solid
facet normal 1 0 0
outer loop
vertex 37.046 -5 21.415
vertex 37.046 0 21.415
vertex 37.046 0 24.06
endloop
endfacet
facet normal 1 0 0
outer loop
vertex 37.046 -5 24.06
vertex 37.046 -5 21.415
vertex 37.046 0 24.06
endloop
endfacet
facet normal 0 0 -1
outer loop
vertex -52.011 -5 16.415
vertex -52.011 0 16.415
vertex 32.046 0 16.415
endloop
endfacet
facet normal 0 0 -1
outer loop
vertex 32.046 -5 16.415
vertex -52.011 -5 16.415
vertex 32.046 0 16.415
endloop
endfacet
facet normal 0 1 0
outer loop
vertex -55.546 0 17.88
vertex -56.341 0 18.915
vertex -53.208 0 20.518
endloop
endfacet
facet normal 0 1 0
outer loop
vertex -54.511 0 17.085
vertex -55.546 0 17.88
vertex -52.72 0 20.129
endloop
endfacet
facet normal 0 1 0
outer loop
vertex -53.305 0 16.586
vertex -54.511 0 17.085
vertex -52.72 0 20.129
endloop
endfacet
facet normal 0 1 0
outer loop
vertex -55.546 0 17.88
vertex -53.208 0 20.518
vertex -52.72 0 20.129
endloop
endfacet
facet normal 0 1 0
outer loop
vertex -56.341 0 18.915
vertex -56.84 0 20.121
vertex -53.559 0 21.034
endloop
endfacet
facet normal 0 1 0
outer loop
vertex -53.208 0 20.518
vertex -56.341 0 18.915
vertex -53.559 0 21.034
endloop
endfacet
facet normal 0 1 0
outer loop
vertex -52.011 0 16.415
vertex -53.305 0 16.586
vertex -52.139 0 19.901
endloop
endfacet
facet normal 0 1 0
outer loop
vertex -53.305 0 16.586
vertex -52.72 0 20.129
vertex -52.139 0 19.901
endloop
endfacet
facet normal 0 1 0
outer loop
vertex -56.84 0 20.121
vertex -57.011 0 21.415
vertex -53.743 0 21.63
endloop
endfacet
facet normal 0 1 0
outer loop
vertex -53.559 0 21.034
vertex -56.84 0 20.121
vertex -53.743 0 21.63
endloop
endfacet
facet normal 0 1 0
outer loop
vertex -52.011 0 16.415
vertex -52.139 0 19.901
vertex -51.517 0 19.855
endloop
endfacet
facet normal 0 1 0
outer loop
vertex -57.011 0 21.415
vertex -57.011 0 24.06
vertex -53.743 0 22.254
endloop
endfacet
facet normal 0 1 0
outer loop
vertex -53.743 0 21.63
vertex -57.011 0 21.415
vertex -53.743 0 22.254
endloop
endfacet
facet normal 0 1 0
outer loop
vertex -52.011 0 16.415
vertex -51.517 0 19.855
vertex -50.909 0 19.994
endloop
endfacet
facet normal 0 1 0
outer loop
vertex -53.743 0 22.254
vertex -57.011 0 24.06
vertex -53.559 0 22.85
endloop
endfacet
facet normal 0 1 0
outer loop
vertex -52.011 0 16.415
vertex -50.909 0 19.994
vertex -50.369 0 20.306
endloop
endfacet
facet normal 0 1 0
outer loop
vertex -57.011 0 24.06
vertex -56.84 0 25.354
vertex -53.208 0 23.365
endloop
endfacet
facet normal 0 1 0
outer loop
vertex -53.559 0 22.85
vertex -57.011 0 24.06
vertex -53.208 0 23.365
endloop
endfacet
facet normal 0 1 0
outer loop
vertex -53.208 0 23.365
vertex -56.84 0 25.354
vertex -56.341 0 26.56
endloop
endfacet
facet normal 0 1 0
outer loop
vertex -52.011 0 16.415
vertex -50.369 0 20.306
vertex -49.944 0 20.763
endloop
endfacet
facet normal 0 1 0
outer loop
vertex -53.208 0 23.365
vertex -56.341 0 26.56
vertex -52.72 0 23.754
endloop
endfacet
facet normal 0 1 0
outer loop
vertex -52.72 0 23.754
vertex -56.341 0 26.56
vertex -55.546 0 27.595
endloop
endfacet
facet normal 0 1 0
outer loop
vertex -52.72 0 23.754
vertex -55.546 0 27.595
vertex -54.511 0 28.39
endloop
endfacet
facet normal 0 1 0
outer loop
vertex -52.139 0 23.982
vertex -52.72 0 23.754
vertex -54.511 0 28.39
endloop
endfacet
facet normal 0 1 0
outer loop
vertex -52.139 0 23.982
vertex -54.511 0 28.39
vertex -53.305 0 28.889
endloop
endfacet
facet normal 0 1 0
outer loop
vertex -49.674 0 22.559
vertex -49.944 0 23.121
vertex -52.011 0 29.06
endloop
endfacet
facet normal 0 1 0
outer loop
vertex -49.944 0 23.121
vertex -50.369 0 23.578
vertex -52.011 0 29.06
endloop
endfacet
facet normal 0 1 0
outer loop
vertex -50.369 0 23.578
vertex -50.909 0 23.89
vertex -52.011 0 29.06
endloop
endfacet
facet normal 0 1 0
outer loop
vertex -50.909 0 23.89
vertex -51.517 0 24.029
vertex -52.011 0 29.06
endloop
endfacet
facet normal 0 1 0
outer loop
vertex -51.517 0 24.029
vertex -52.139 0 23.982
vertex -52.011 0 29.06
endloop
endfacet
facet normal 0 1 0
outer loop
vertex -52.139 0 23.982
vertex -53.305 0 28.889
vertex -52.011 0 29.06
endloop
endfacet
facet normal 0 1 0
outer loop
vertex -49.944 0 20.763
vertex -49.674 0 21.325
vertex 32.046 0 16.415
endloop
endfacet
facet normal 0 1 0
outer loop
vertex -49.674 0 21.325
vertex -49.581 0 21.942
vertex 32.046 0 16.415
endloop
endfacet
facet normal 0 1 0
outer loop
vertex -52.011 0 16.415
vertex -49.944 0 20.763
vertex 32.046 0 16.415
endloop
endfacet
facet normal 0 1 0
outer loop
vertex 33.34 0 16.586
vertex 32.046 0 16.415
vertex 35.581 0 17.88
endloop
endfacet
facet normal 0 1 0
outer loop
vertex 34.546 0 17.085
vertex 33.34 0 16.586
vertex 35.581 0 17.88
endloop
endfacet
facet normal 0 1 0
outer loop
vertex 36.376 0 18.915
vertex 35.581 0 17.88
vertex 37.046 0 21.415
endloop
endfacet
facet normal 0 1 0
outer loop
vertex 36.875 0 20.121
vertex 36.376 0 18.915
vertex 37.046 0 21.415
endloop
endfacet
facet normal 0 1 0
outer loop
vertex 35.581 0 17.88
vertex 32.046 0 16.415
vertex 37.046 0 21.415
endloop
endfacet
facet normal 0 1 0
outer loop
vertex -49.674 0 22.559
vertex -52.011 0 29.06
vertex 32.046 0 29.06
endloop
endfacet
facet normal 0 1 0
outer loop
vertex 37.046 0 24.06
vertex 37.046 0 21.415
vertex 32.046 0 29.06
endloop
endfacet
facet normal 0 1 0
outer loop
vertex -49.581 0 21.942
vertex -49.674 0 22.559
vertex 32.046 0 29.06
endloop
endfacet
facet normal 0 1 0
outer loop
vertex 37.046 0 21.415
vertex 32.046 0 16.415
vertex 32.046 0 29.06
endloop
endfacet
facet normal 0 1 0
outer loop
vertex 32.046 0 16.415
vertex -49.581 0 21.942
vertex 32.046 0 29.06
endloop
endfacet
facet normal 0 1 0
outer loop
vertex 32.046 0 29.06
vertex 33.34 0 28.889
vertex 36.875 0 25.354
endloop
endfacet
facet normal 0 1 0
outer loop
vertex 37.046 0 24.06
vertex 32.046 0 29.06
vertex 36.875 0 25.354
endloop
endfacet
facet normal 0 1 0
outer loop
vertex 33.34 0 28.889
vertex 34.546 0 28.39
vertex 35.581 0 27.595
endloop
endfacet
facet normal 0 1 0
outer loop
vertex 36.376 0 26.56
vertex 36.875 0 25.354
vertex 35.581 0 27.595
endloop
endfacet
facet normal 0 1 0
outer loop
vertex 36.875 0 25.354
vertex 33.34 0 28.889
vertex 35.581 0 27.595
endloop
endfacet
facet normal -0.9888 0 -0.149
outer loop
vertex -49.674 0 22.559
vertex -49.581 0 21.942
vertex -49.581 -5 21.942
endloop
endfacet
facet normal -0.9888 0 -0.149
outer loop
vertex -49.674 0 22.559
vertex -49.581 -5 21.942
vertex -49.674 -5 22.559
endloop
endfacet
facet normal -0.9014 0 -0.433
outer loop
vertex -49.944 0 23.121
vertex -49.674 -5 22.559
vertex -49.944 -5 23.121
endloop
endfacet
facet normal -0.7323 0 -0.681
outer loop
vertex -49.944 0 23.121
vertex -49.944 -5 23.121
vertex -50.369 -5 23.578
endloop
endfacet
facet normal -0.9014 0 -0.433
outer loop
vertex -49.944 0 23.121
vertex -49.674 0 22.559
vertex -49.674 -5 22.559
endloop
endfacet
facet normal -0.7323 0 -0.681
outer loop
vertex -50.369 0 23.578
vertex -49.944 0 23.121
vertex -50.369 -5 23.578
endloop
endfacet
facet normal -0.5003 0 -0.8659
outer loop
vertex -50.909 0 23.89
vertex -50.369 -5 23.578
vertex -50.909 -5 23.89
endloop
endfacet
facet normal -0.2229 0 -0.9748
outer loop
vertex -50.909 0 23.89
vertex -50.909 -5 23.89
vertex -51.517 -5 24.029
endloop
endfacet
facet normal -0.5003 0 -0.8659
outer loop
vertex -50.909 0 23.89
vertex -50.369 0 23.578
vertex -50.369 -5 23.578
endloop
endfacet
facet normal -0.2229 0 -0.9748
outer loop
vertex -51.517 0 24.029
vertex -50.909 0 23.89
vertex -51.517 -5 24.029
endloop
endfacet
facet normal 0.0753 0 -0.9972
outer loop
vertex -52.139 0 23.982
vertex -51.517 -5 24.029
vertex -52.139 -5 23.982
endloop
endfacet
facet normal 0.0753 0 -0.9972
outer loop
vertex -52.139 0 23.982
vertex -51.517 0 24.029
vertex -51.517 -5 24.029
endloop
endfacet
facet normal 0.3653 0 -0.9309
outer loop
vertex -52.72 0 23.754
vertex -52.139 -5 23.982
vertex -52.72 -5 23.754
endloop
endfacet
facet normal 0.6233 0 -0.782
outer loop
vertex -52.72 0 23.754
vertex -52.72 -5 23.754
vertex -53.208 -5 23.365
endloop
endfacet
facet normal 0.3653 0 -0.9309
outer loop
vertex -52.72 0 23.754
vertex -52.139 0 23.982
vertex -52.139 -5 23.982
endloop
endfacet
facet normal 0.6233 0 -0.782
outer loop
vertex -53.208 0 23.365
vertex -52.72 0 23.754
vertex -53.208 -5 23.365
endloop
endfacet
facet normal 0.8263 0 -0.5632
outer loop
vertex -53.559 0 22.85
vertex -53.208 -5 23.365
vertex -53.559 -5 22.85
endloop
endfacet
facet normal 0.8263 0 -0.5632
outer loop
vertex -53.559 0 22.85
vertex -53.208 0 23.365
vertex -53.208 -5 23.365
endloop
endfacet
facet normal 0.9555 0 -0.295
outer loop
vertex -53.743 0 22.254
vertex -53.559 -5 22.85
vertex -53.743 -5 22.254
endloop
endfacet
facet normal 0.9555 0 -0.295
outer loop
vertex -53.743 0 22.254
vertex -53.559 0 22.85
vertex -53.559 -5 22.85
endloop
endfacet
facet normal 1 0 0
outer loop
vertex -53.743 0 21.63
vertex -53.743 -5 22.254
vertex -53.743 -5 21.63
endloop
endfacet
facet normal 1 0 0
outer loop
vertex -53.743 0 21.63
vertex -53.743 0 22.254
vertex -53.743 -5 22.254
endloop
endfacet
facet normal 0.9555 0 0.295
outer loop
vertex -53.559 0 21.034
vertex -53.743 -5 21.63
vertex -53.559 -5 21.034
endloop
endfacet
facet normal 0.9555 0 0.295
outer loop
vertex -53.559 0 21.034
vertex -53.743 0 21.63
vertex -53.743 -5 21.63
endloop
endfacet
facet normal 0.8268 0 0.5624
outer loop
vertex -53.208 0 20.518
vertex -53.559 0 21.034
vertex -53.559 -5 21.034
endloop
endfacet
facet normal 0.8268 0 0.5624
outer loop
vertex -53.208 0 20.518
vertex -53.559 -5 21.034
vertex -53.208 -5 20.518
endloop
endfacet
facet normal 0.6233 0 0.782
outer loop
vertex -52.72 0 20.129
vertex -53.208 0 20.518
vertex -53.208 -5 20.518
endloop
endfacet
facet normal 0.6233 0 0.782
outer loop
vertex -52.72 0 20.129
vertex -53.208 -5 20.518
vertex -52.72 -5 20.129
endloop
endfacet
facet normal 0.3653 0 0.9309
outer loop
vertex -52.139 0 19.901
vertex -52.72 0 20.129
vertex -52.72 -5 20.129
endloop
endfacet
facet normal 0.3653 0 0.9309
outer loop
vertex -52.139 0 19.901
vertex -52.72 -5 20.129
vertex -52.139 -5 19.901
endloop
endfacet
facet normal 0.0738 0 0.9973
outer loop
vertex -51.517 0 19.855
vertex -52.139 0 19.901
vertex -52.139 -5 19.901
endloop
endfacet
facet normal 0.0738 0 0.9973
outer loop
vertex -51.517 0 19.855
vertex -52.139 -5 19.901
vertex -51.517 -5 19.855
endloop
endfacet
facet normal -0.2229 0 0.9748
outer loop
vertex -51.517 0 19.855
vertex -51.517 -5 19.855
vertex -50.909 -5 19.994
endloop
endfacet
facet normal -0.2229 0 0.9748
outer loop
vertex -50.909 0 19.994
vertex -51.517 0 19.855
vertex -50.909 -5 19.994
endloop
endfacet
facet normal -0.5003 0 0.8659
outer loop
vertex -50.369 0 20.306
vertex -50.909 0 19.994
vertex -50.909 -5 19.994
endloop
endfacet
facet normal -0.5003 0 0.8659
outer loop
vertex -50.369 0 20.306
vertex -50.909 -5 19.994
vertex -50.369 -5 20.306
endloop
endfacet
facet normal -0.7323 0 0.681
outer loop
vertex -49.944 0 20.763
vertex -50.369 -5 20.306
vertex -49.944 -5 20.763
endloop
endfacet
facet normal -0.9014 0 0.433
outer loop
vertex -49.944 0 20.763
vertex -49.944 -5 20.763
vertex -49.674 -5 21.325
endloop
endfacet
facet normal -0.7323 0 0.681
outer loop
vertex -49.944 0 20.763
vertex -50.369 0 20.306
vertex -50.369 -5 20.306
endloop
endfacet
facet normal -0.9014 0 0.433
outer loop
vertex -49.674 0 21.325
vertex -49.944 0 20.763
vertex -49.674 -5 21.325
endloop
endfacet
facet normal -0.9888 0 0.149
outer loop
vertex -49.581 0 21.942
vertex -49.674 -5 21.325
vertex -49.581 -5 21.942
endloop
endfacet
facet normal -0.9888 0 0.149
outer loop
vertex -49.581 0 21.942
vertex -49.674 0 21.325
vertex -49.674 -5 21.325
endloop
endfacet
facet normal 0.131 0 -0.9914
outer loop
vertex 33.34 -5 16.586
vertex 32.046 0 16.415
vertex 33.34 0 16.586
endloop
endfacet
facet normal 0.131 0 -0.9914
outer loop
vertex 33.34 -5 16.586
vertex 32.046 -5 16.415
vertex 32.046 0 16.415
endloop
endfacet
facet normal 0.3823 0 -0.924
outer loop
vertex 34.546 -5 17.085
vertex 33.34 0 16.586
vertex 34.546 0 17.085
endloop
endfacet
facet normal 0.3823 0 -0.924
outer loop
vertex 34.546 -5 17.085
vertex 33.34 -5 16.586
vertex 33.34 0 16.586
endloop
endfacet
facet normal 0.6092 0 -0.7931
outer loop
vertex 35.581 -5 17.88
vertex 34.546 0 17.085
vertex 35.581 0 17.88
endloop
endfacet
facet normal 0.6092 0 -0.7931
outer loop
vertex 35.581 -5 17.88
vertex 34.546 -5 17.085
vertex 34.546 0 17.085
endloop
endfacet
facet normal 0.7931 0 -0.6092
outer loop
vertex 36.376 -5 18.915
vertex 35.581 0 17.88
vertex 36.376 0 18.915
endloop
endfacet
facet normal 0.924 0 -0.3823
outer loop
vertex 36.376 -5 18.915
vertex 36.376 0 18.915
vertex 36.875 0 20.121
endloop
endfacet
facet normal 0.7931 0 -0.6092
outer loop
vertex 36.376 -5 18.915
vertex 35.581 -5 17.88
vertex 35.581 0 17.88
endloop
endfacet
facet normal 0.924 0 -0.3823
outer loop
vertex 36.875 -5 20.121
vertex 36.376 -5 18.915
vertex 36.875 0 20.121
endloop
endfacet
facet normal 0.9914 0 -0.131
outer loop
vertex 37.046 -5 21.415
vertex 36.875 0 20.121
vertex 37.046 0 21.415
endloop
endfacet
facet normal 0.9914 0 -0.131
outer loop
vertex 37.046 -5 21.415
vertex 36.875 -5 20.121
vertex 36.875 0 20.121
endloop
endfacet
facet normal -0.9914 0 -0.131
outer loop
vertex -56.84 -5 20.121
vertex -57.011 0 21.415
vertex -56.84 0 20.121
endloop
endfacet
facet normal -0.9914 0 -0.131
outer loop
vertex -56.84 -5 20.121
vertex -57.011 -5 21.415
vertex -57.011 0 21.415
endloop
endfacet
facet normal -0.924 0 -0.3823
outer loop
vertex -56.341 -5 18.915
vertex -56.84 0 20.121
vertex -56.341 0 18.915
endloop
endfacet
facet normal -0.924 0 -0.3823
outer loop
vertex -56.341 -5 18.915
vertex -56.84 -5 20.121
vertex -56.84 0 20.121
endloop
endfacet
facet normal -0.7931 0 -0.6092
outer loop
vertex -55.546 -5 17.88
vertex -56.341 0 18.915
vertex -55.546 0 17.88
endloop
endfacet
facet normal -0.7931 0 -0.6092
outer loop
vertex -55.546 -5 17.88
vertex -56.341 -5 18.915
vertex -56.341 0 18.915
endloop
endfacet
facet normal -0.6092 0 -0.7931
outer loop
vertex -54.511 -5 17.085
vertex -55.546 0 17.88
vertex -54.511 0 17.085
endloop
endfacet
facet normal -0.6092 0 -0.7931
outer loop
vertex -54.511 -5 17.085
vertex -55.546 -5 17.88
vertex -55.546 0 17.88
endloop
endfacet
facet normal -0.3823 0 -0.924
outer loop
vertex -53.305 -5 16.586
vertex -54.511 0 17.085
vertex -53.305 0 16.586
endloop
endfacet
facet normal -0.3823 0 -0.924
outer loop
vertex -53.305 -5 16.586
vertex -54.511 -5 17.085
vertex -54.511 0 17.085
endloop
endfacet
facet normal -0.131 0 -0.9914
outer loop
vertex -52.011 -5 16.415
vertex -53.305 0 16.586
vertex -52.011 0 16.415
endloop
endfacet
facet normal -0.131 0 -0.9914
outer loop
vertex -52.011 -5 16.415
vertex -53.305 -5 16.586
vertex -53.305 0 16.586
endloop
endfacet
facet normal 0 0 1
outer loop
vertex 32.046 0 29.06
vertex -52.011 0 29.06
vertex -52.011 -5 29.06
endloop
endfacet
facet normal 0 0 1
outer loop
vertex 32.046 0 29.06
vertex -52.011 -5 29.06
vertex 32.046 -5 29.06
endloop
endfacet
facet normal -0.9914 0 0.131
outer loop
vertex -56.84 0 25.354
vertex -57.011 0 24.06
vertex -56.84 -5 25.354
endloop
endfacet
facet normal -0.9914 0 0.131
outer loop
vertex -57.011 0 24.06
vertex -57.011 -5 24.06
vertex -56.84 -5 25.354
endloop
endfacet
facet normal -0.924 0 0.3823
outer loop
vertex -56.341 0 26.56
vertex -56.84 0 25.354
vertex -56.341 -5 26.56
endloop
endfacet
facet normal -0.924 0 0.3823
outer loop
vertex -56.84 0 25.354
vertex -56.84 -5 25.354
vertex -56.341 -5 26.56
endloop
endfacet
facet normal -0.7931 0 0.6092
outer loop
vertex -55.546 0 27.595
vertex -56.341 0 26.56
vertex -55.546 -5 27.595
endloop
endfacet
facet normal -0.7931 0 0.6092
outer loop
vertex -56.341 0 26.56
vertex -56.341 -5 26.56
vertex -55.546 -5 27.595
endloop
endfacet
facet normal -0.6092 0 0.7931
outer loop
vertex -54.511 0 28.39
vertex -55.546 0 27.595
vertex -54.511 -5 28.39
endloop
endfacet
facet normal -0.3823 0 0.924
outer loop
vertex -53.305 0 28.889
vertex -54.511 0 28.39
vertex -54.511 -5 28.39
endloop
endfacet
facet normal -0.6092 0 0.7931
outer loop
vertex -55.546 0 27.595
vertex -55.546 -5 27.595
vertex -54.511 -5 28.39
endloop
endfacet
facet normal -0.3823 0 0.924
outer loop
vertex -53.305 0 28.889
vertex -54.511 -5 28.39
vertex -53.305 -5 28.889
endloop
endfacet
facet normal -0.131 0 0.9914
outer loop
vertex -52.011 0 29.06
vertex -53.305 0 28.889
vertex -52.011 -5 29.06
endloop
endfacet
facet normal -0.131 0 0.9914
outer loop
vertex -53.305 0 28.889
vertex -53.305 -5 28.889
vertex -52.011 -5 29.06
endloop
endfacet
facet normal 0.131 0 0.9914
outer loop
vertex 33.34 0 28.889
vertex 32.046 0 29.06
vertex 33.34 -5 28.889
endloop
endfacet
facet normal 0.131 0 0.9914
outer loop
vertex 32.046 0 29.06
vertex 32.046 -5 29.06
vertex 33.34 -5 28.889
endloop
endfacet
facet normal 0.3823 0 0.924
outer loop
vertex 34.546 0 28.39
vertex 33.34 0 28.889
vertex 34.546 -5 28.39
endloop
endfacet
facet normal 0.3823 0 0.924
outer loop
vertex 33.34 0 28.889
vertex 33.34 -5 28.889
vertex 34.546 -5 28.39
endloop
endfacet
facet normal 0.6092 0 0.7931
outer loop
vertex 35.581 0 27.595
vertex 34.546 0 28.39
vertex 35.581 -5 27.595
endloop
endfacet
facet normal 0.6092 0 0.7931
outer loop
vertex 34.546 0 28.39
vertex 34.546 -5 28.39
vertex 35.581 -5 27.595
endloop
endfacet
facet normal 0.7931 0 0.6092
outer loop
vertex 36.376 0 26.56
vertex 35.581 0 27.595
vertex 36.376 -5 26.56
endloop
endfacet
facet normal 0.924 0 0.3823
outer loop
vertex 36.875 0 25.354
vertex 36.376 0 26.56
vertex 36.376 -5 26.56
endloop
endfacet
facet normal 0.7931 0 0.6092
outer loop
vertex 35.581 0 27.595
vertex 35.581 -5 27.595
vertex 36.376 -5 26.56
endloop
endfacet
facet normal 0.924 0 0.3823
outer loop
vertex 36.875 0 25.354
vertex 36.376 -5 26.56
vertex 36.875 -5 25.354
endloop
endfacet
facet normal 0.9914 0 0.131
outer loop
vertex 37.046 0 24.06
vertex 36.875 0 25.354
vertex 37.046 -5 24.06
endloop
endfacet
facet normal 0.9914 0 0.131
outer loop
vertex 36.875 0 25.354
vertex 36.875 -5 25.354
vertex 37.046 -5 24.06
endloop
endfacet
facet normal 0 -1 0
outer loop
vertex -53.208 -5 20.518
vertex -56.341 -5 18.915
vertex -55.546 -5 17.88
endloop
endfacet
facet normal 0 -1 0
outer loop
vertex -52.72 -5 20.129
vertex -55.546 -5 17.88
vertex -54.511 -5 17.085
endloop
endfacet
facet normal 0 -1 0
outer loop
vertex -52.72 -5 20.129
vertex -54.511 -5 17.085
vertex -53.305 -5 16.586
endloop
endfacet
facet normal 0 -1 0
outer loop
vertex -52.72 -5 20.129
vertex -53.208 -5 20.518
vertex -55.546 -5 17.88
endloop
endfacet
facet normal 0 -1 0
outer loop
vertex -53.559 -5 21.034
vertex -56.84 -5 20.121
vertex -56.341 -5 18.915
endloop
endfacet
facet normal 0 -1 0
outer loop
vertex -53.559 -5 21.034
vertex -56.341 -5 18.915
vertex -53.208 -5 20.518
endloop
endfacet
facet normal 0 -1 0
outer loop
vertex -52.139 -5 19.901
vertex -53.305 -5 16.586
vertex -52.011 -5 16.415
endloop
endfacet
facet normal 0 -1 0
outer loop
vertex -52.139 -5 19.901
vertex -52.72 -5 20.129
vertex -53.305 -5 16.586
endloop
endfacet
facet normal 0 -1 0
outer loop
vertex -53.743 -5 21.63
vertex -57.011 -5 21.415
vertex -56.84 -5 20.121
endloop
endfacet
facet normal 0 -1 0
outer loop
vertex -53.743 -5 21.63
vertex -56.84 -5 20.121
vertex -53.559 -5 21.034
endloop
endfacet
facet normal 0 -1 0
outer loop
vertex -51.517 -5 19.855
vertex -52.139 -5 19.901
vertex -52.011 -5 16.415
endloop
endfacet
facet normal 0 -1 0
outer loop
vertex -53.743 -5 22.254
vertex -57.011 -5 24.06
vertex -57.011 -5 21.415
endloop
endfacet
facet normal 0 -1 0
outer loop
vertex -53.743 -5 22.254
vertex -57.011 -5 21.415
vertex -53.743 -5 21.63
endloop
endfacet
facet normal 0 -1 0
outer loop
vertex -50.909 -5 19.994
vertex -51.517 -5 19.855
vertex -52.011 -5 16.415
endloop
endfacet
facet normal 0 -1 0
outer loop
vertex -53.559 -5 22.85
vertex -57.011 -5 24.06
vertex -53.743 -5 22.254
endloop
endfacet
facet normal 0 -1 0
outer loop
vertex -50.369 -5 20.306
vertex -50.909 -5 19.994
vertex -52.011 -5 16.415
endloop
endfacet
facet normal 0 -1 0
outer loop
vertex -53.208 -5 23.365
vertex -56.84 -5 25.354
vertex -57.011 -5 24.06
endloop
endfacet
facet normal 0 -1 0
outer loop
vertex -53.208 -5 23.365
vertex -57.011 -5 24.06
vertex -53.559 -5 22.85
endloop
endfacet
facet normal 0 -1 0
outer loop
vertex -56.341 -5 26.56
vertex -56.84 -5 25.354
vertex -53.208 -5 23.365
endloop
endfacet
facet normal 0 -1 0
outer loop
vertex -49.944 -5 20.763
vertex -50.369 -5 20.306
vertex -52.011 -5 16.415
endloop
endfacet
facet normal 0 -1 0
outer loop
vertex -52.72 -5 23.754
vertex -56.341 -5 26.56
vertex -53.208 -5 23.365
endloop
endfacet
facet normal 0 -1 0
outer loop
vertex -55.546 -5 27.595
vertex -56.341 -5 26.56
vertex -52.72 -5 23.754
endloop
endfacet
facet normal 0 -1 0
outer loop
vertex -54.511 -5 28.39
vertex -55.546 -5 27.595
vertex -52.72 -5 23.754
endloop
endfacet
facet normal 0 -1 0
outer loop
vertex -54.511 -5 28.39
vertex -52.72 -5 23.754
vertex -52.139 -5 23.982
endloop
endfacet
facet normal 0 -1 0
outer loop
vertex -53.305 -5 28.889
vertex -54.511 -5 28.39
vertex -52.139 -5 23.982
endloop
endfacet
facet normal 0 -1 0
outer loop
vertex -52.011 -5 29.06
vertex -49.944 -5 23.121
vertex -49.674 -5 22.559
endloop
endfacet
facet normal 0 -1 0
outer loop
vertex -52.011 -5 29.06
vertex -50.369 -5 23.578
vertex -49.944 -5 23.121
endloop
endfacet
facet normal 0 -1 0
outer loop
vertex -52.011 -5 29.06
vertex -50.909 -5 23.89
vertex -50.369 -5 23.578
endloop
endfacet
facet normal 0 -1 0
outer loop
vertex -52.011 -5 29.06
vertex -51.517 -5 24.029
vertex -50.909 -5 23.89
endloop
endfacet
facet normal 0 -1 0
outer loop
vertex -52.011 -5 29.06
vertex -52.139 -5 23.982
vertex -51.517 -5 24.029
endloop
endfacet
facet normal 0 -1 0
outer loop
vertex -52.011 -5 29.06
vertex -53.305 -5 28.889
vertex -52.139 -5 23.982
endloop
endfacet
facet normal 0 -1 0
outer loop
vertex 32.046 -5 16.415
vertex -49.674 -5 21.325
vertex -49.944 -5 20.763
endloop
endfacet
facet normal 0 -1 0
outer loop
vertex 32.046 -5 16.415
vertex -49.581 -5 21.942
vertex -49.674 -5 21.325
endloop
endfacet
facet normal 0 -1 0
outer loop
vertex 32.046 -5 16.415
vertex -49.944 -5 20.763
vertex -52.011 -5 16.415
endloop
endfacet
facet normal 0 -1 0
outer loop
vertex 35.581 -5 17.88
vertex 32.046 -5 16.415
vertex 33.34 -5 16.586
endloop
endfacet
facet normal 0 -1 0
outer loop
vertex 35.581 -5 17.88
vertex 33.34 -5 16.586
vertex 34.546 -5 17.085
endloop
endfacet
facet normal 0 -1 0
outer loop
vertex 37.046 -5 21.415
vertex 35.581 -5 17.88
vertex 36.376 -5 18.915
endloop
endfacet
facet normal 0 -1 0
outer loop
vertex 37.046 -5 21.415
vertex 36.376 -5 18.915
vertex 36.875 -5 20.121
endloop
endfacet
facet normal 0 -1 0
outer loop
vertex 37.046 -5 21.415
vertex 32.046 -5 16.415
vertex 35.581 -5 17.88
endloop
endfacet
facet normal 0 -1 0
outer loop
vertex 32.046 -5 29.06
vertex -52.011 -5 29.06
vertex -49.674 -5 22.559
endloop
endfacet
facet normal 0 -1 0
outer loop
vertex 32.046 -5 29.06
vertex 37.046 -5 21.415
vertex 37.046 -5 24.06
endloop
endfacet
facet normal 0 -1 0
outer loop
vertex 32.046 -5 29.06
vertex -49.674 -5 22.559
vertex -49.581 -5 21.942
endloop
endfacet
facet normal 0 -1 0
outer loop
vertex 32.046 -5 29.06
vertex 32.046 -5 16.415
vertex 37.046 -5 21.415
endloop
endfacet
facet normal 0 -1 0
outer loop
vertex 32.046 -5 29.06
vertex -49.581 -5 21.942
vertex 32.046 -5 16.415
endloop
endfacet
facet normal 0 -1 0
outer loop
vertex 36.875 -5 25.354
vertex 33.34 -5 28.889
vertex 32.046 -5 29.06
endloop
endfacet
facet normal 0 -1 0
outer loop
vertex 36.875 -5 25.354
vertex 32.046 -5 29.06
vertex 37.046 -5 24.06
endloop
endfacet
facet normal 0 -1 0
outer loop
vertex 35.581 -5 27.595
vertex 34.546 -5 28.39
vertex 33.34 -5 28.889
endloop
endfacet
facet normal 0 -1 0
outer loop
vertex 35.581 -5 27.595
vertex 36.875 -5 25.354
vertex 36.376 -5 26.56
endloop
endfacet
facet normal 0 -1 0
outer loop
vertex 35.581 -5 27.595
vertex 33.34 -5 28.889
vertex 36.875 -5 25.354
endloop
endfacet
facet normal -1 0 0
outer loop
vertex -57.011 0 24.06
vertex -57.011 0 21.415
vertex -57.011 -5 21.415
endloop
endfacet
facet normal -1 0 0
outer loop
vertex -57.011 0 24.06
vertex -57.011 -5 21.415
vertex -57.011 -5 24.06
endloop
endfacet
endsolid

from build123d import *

# Parameters (mm, degrees)
F0_W     = 94.0563417971
F0_H     = 12.6443672925
F0_R     = 2.0927521529
F1_DEPTH = 5
F2_R     = 5


# Not quite as in the source:
# - the program builds the solid bodies; features that only make, move or delete a surface that nothing else refers to are left out


with BuildPart() as f1:
    # F0 (on Front) → F1 (new body)
    with BuildSketch(Plane.XZ):
        with Locations((-9.9823940545, 22.7376772091)):
            Rectangle(F0_W, F0_H)
        with Locations((-51.6735911369, 21.9417177141)):
            Circle(F0_R, mode=Mode.SUBTRACT)
    extrude(amount=F1_DEPTH)

    # F2
    f2_edges = [f1.edges().sort_by_distance(p)[0] for p in [
        (37.045777, -2.5, 29.059861),
        (37.045777, -2.5, 16.415494),
        (-57.010565, -2.5, 16.415494),
        (-57.010565, -2.5, 29.059861),
    ]]
    fillet(f2_edges, radius=F2_R)


solid = f1.part
